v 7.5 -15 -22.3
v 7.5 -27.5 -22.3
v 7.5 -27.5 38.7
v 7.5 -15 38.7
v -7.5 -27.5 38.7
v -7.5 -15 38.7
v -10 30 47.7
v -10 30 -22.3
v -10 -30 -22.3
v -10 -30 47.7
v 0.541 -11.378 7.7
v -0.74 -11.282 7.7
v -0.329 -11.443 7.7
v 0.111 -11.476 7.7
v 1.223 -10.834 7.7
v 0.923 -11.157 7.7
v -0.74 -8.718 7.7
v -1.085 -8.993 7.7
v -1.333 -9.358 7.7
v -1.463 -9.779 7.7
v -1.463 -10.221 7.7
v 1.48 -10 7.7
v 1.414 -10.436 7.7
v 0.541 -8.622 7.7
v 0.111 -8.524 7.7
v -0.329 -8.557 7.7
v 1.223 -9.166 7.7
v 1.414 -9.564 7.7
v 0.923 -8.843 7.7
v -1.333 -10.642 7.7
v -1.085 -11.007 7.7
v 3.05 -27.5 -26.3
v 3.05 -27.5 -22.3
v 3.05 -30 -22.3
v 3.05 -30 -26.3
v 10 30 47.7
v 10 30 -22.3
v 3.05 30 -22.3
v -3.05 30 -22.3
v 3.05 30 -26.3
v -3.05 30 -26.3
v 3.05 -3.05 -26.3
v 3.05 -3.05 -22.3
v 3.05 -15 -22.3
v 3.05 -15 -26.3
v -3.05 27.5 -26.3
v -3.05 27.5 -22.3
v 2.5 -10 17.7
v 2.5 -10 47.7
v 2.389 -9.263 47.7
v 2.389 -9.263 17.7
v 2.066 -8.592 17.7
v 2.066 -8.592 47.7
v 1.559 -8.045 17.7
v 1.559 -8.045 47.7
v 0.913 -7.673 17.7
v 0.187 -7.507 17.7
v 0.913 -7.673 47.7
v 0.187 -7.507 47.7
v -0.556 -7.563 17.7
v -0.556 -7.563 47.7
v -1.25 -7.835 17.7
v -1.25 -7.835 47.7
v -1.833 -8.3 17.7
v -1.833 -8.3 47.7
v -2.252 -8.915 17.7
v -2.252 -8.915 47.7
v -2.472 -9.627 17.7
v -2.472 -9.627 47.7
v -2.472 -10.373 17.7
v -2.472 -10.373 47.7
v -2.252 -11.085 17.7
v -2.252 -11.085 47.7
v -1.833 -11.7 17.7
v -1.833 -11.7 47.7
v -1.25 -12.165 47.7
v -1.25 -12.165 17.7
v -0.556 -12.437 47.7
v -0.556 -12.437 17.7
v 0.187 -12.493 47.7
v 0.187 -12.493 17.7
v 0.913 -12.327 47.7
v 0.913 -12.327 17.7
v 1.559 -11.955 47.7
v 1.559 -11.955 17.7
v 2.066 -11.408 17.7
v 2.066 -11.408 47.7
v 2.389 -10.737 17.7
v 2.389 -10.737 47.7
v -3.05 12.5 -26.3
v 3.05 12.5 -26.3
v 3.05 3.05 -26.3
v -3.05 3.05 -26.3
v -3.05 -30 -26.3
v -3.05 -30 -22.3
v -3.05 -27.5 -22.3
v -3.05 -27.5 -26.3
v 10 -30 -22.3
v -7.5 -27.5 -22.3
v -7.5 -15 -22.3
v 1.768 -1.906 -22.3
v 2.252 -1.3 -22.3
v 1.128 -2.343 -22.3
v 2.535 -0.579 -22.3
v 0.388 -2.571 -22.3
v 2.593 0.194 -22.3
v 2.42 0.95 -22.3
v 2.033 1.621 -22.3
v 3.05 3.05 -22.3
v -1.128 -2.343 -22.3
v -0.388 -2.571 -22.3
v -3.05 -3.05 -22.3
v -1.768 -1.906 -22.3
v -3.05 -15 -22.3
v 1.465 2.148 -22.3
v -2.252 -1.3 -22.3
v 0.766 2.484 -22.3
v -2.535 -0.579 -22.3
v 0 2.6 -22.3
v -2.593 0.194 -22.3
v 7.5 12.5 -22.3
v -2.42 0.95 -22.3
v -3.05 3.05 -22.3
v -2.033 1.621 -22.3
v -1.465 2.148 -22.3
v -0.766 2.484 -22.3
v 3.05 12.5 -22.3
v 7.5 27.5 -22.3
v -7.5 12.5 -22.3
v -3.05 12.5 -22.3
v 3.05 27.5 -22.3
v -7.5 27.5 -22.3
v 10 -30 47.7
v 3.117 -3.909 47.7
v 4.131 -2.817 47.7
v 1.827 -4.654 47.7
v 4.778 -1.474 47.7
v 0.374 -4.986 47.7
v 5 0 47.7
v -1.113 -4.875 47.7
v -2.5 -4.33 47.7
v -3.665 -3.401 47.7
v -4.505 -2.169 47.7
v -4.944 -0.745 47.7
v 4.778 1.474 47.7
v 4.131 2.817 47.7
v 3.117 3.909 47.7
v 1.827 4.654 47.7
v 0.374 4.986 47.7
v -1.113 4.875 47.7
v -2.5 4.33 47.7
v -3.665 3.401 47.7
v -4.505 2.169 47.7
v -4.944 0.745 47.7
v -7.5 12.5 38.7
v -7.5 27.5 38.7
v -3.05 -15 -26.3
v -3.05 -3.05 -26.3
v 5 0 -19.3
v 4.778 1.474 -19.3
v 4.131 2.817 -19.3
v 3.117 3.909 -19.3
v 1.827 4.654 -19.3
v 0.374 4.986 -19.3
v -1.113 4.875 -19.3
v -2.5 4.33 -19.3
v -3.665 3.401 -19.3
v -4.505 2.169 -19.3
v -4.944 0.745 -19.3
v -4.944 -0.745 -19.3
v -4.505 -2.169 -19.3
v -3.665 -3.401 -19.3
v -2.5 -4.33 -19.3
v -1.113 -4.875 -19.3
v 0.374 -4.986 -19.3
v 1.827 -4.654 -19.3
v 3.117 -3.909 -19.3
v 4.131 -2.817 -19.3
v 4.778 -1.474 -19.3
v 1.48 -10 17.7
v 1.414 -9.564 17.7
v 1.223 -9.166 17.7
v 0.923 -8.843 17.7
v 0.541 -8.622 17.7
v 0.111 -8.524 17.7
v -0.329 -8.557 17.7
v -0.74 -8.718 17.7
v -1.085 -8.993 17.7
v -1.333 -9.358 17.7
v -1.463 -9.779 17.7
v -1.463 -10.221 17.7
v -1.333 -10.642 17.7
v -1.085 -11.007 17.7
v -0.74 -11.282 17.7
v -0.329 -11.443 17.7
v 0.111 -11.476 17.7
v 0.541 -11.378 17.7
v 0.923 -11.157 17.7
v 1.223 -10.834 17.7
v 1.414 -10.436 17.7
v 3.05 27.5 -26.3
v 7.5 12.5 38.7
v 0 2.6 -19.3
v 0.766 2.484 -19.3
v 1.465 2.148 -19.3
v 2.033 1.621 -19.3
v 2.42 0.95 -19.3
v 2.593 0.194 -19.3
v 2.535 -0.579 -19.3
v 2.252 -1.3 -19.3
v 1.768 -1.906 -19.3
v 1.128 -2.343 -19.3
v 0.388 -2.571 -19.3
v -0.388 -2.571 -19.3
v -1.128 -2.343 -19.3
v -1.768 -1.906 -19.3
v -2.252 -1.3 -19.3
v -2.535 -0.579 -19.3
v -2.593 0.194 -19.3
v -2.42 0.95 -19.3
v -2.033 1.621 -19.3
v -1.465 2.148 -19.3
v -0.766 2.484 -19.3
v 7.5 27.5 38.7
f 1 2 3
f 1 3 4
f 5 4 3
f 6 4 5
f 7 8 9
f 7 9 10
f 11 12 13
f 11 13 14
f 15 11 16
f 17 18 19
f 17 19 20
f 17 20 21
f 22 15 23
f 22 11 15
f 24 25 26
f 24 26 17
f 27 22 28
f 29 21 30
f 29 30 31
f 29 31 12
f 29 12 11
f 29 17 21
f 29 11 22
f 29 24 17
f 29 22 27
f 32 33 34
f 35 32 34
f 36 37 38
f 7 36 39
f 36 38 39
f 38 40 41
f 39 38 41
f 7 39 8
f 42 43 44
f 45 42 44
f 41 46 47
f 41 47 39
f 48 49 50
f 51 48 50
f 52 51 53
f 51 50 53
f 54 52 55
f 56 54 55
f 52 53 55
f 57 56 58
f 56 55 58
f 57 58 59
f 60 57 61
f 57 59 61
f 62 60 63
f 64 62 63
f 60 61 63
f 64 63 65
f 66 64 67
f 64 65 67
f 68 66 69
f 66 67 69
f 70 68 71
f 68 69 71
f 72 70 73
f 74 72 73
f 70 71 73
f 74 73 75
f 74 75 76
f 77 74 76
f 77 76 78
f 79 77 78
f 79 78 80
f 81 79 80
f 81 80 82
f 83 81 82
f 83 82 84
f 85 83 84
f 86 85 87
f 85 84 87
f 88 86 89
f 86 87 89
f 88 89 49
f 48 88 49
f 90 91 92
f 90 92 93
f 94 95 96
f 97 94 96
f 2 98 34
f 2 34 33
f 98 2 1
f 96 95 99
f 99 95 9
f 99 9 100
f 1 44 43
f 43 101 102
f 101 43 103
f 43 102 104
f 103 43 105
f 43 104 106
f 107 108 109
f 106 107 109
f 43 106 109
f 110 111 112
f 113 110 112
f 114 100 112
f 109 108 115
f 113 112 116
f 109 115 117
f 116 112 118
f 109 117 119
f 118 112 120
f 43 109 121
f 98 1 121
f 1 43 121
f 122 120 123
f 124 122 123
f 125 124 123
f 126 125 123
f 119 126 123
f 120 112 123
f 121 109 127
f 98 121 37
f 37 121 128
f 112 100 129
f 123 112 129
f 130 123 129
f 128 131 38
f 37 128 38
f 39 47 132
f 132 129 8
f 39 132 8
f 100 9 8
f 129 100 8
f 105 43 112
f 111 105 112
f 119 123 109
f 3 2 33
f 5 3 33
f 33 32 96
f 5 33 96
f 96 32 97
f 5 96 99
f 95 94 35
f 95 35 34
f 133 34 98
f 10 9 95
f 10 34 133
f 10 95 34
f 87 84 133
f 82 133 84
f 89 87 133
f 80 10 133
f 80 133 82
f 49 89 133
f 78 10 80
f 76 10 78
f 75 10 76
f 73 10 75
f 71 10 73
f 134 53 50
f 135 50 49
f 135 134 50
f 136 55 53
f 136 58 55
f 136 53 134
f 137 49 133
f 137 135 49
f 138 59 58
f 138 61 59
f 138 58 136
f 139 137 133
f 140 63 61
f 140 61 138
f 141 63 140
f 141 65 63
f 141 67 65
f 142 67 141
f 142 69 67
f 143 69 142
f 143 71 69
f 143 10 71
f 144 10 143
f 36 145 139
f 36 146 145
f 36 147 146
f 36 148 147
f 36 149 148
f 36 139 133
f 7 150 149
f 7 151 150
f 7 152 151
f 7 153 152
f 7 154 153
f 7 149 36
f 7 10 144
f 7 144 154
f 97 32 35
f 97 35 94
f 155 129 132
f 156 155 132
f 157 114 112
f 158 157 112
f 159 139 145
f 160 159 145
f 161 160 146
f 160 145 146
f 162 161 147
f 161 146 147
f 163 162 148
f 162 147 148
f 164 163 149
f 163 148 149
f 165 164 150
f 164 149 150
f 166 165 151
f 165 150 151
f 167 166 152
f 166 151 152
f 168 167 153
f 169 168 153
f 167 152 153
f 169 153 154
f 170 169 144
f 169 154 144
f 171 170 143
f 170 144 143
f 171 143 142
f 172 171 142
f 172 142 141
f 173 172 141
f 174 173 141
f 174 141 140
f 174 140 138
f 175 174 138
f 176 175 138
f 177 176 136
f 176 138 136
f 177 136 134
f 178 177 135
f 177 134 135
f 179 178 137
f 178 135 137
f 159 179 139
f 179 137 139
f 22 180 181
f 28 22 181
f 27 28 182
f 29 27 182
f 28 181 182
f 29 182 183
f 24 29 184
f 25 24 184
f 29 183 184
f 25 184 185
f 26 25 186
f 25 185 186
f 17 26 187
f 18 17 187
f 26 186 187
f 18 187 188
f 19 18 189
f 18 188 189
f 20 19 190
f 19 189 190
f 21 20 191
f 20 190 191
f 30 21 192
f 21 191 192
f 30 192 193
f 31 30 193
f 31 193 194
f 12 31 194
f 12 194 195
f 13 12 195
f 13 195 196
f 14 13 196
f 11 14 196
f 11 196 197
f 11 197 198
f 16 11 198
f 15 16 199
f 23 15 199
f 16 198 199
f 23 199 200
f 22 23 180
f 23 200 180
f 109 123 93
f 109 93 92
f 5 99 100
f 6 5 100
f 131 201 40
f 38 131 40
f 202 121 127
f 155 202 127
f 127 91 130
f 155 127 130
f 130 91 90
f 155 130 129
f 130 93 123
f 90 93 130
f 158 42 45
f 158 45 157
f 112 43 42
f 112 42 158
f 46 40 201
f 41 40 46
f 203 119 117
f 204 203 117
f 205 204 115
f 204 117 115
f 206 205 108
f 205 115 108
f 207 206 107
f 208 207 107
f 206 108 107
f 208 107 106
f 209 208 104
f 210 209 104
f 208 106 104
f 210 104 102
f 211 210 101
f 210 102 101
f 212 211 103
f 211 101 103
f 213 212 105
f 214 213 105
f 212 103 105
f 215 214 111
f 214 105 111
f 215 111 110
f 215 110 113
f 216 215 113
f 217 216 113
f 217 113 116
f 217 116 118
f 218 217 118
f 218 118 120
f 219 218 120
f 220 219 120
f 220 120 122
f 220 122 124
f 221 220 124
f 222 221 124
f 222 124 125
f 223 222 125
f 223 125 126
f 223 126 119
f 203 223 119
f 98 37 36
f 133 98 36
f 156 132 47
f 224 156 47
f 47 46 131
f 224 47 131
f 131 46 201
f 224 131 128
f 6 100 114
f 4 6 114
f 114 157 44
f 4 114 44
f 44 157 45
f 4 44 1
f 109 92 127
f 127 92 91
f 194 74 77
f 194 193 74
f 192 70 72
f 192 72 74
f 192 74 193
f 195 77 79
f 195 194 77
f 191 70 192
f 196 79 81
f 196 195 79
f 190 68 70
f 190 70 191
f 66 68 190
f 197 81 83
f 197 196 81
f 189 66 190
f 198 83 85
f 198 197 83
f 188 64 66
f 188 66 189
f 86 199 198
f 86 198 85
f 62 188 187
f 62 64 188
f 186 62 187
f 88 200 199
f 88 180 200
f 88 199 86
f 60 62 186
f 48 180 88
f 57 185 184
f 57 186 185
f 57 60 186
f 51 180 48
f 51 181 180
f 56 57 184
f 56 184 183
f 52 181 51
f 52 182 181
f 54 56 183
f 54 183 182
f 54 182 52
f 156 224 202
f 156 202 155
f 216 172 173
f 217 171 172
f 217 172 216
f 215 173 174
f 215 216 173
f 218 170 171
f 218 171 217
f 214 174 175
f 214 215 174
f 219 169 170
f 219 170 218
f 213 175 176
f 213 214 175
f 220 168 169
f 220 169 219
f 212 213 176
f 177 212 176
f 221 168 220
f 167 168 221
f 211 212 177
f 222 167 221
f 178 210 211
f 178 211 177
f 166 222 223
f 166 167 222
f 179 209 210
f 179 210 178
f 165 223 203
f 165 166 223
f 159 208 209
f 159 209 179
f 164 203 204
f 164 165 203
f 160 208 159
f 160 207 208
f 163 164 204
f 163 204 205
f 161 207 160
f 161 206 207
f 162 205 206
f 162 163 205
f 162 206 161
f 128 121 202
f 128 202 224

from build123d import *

# Parameters (mm, degrees)
EXTRUDE_1_DEPTH      = 14
CUT_EXTRUDE_1_DEPTH  = 44
SKETCH_3_W           = 6.2
SKETCH_3_H           = 6.2
CUT_EXTRUDE_2_DEPTH  = 4
SKETCH_4_R           = 4
CUT_EXTRUDE_3_DEPTH  = 5
SKETCH_5_R           = 2.6
CUT_EXTRUDE_4_DEPTH  = 5
CUT_EXTRUDE_5_DEPTH  = 50
EXTRUDE_2_DEPTH      = 8
EXTRUDE_3_DEPTH      = 8
SKETCH_10_W          = 20
SKETCH_10_H          = 10
EXTRUDE_4_DEPTH      = 18
SKETCH_12_R          = 1.48
CUT_EXTRUDE_6_DEPTH  = 20
SKETCH_13_W          = 4
SKETCH_13_H          = 40
CUT_EXTRUDE_7_DEPTH  = 22
SKETCH_16_R          = 5
CUT_EXTRUDE_8_DEPTH  = 3
SKETCH_17_R          = 5
CUT_EXTRUDE_9_DEPTH  = 3
SKETCH_18_R          = 2.6
CUT_EXTRUDE_10_DEPTH = 99
SKETCH_19_R          = 5
EXTRUDE_5_DEPTH      = 6
SKETCH_20_W          = 6.2
SKETCH_20_H          = 6.2
CUT_EXTRUDE_11_DEPTH = 4
SKETCH_21_W          = 6.2
SKETCH_21_H          = 6.2
EXTRUDE_6_DEPTH      = 4
SKETCH_22_W          = 0.05
SKETCH_22_H          = 60
CUT_EXTRUDE_12_DEPTH = 4
EXTRUDE_START        = 6
SKETCH_25_W          = 20
SKETCH_25_H          = 10
SKETCH_25_R          = 1.48
EXTRUDE_7_DEPTH      = 6
CUT_EXTRUDE_13_DEPTH = 7
SKETCH_28_W          = 8
SKETCH_28_H          = 10
EXTRUDE_8_DEPTH      = 20
CUT_EXTRUDE_14_DEPTH = 7
SKETCH_30_W          = 6
SKETCH_30_H          = 2.9827115
SKETCH_30_H_2        = 3.265133333
EXTRUDE_9_DEPTH      = 7
SKETCH_31_W          = 6
SKETCH_31_H          = 2
EXTRUDE_10_DEPTH     = 10
SKETCH_32_W          = 6.1
SKETCH_32_H          = 3
CUT_EXTRUDE_15_DEPTH = 10
SKETCH_33_W          = 6.1
SKETCH_33_H          = 3
CUT_EXTRUDE_16_DEPTH = 4
SKETCH_34_W          = 10
SKETCH_34_H          = 5
CUT_EXTRUDE_17_DEPTH = 6
SKETCH_35_W          = 1
SKETCH_35_H          = 5
CUT_EXTRUDE_18_DEPTH = 14
SKETCH_36_W          = 6
SKETCH_36_H          = 5
EXTRUDE_11_DEPTH     = 6
SKETCH_37_W          = 8
SKETCH_37_H          = 1
CUT_EXTRUDE_19_DEPTH = 2
SKETCH_38_R          = 5
EXTRUDE_12_DEPTH     = 6
SKETCH_39_R          = 2.6
CUT_EXTRUDE_20_DEPTH = 10
SKETCH_40_R          = 5
CUT_EXTRUDE_21_DEPTH = 3
EXTRUDE_START_2      = 1
SKETCH_41_W          = 20
SKETCH_41_H          = 40
SKETCH_41_R          = 5
EXTRUDE_13_DEPTH     = 1
SKETCH_42_W          = 20
SKETCH_42_H          = 10
SKETCH_42_R          = 1.48
EXTRUDE_14_DEPTH     = 1
SKETCH_43_W          = 5
SKETCH_43_H          = 5
CUT_EXTRUDE_22_DEPTH = 15
EXTRUDE_15_DEPTH     = 2
SKETCH_45_W          = 6.1
SKETCH_45_H          = 18.1
EXTRUDE_16_DEPTH     = 10
CUT_EXTRUDE_START    = -4
CUT_EXTRUDE_23_DEPTH = 4
SKETCH_47_W          = 15
SKETCH_47_H          = 7.002427308
EXTRUDE_17_DEPTH     = 4
CUT_EXTRUDE_24_DEPTH = 1
SKETCH_49_W          = 2
SKETCH_49_H          = 1
CUT_EXTRUDE_27_DEPTH = 12.5
SKETCH_51_W          = 5
SKETCH_51_H          = 1
EXTRUDE_18_DEPTH     = 1
CUT_EXTRUDE_28_DEPTH = 5
EXTRUDE_19_DEPTH     = 7.5
SKETCH_54_W          = 6.95
SKETCH_54_H          = 2
CUT_EXTRUDE_29_DEPTH = 7.5
SKETCH_55_W          = 6.1
SKETCH_55_H          = 3
CUT_EXTRUDE_30_DEPTH = 4
SKETCH_56_W          = 0.55
SKETCH_56_H          = 0.142857143
EXTRUDE_20_DEPTH     = 4
SKETCH_60_W          = 26.3
SKETCH_60_H          = 60
EXTRUDE_21_DEPTH     = 20
EXTRUDE_22_DEPTH     = 4
SKETCH_62_R          = 2.6
CUT_EXTRUDE_31_DEPTH = 50
SKETCH_63_R          = 5
CUT_EXTRUDE_32_DEPTH = 30.3
CUT_EXTRUDE_33_DEPTH = 4
CUT_EXTRUDE_34_DEPTH = 2
SKETCH_66_W          = 5
SKETCH_66_H          = 2
CUT_EXTRUDE_35_DEPTH = 50
CUT_EXTRUDE_36_DEPTH = 4
SKETCH_68_W          = 5
SKETCH_68_H          = 2
CUT_EXTRUDE_37_DEPTH = 2
SKETCH_69_W          = 13
SKETCH_69_H          = 7
EXTRUDE_23_DEPTH     = 15
SKETCH_70_W          = 13
SKETCH_70_H          = 7
CUT_EXTRUDE_38_DEPTH = 15
SKETCH_72_W          = 20
SKETCH_72_H          = 60
EXTRUDE_24_DEPTH     = 61.3
SKETCH_73_W          = 6.1
SKETCH_73_H          = 12
EXTRUDE_25_DEPTH     = 4
SKETCH_74_R          = 2.6
CUT_EXTRUDE_39_DEPTH = 70
SKETCH_76_W          = 70
SKETCH_76_H          = 60
EXTRUDE_26_DEPTH     = 20
SKETCH_77_R          = 2.6
CUT_EXTRUDE_40_DEPTH = 70
SKETCH_78_R          = 5
CUT_EXTRUDE_41_DEPTH = 67
SKETCH_79_R          = 2.5
CUT_EXTRUDE_42_DEPTH = 30
SKETCH_80_R          = 1.48
CUT_EXTRUDE_43_DEPTH = 10
SKETCH_81_W          = 4.45
SKETCH_81_H          = 15
SKETCH_81_W_2        = 6.1
CUT_EXTRUDE_45_DEPTH = 65
SKETCH_82_W          = 4.45
SKETCH_82_H          = 12.5
SKETCH_82_W_2        = 3.05
CUT_EXTRUDE_46_DEPTH = 65


with BuildPart() as part:
    # 草图1 → 凸台-拉伸1 (new body)
    with BuildSketch(Plane.XY):
        Polygon((-15, 22), (-15, -22), (15, -22), (15, 22), (0, 22), align=None)
    extrude(amount=EXTRUDE_1_DEPTH)

    # 草图2 → 切除-拉伸1 (cut)
    with BuildSketch(Plane(origin=(0, 22, 0), x_dir=(1, 0, 0), z_dir=(0, 1, 0))):
        Polygon((-15, 0), (-15, -14), (-10, -4), (-3.1, -4), (-3.1, 0), align=None)
        Polygon((3.1, -4), (10, -4), (15, -14), (15, 0), (3.1, 0), align=None)
    extrude(amount=-CUT_EXTRUDE_1_DEPTH, mode=Mode.SUBTRACT)

    # 草图3 → 切除-拉伸2 (cut)
    with BuildSketch(Plane(origin=(0, 0, 0), x_dir=(-1, 0, 0), z_dir=(0, 0, -1))):
        Rectangle(SKETCH_3_W, SKETCH_3_H)
    extrude(amount=-CUT_EXTRUDE_2_DEPTH, mode=Mode.SUBTRACT)

    # 草图4 → 切除-拉伸3 (cut)
    with BuildSketch(Plane.XY.offset(14)):
        Circle(SKETCH_4_R)
    extrude(amount=-CUT_EXTRUDE_3_DEPTH, mode=Mode.SUBTRACT)

    # 草图5 → 切除-拉伸4 (cut)
    with BuildSketch(Plane.XY.offset(9)):
        Circle(SKETCH_5_R)
    extrude(amount=-CUT_EXTRUDE_4_DEPTH, mode=Mode.SUBTRACT)

    # 草图6 → 切除-拉伸5 (cut)
    with BuildSketch(Plane.XZ.offset(22)):
        Polygon((-10, 4), (-15, 14), (-10, 14), align=None)
        Polygon((10, 4), (10, 14), (15, 14), align=None)
    extrude(amount=-CUT_EXTRUDE_5_DEPTH, mode=Mode.SUBTRACT)

    # 草图8 → 凸台-拉伸2 (add)
    with BuildSketch(Plane(origin=(0, -22, 0), x_dir=(-1, 0, 0), z_dir=(0, -1, 0))):
        Polygon((10, -14), (-10, -14), (-10, -4), (-3.1, -4), (-3.1, 0), (3.1, 0), (3.1, -4), (10, -4), align=None)
    extrude(amount=EXTRUDE_2_DEPTH)

    # 草图9 → 凸台-拉伸3 (add)
    with BuildSketch(Plane(origin=(0, 22, 0), x_dir=(1, 0, 0), z_dir=(0, 1, 0))):
        Polygon((-3.1, -4), (-3.1, 0), (3.1, 0), (3.1, -4), (10, -4), (10, -14), (-10, -14), (-10, -4), align=None)
    extrude(amount=EXTRUDE_3_DEPTH)

    # 草图10 → 凸台-拉伸4 (add)
    with BuildSketch(Plane.XY.offset(14)):
        with Locations((0, 25)):
            Rectangle(SKETCH_10_W, SKETCH_10_H)
        with Locations((0, -25)):
            Rectangle(SKETCH_10_W, SKETCH_10_H)
    extrude(amount=EXTRUDE_4_DEPTH)

    # 草图12 → 切除-拉伸6 (cut)
    with BuildSketch(Plane.XY.offset(32)):
        with Locations((-4.9, -24.6)):
            Circle(SKETCH_12_R)
        with Locations((4.9, -24.6)):
            Circle(SKETCH_12_R)
        with Locations((-4.9, 24.6)):
            Circle(SKETCH_12_R)
        with Locations((4.9, 24.6)):
            Circle(SKETCH_12_R)
    extrude(amount=-CUT_EXTRUDE_6_DEPTH, mode=Mode.SUBTRACT)

    # 草图13 → 切除-拉伸7 (cut)
    with BuildSketch(Plane(origin=(10, 0, 0), x_dir=(0, 0, -1), z_dir=(1, 0, 0))):
        with Locations((-12, 0)):
            Rectangle(SKETCH_13_W, SKETCH_13_H)
    extrude(amount=-CUT_EXTRUDE_7_DEPTH, mode=Mode.SUBTRACT)

    # 草图16 → 切除-拉伸8 (cut)
    with BuildSketch(Plane.XY.offset(10)):
        Circle(SKETCH_16_R)
    extrude(amount=-CUT_EXTRUDE_8_DEPTH, mode=Mode.SUBTRACT)

    # 草图17 → 切除-拉伸9 (cut)
    with BuildSketch(Plane.XY.offset(10)):
        with Locations((0, 15)):
            Circle(SKETCH_17_R)
        with Locations((0, -15)):
            Circle(SKETCH_17_R)
    extrude(amount=-CUT_EXTRUDE_9_DEPTH, mode=Mode.SUBTRACT)

    # 草图18 → 切除-拉伸10 (cut)
    with BuildSketch(Plane.XY.offset(7)):
        with Locations((0, 15)):
            Circle(SKETCH_18_R)
        with Locations((0, -15)):
            Circle(SKETCH_18_R)
    extrude(amount=-CUT_EXTRUDE_10_DEPTH, mode=Mode.SUBTRACT)

    # 草图19 → 凸台-拉伸5 (add)
    with BuildSketch(Plane.XY.offset(10)):
        Circle(SKETCH_19_R)
    extrude(amount=-EXTRUDE_5_DEPTH)

    # 草图20 → 切除-拉伸11 (cut)
    with BuildSketch(Plane(origin=(0, 0, 0), x_dir=(-1, 0, 0), z_dir=(0, 0, -1))):
        Polygon((0, -11.9), (0, -15), (0, -18.1), (3.1, -18.1), (3.1, -11.9), align=None)
        Polygon((0, -18.1), (0, -15), (0, -11.9), (-3.1, -11.9), (-3.1, -18.1), align=None)
        with Locations((0, 15)):
            Rectangle(SKETCH_20_W, SKETCH_20_H)
    extrude(amount=-CUT_EXTRUDE_11_DEPTH, mode=Mode.SUBTRACT)

    # 草图21 → 凸台-拉伸6 (add)
    with BuildSketch(Plane(origin=(0, 0, 0), x_dir=(-1, 0, 0), z_dir=(0, 0, -1))):
        Rectangle(SKETCH_21_W, SKETCH_21_H)
    extrude(amount=-EXTRUDE_6_DEPTH)

    # 草图22 → 切除-拉伸12 (cut)
    with BuildSketch(Plane(origin=(0, 0, 0), x_dir=(-1, 0, 0), z_dir=(0, 0, -1))):
        with Locations((-3.075, 0)):
            Rectangle(SKETCH_22_W, SKETCH_22_H)
        with Locations((3.075, 0)):
            Rectangle(SKETCH_22_W, SKETCH_22_H)
    extrude(amount=-CUT_EXTRUDE_12_DEPTH, mode=Mode.SUBTRACT)

    # 草图25 → 凸台-拉伸7 (add)
    # profile 1 of 2: a face of its own
    with BuildSketch(Plane.XY.offset(32).offset(EXTRUDE_START)):
        with Locations((0, 25)):
            Rectangle(SKETCH_25_W, SKETCH_25_H)
        with Locations((-4.9, 24.6)):
            Circle(SKETCH_25_R, mode=Mode.SUBTRACT)
        with Locations((4.9, 24.6)):
            Circle(SKETCH_25_R, mode=Mode.SUBTRACT)
    # profile 2 of 2: a face of its own
    with BuildSketch(Plane.XY.offset(32).offset(EXTRUDE_START)):
        with Locations((0, -25)):
            Rectangle(SKETCH_25_W, SKETCH_25_H)
        with Locations((-4.9, -24.6)):
            Circle(SKETCH_25_R, mode=Mode.SUBTRACT)
        with Locations((4.9, -24.6)):
            Circle(SKETCH_25_R, mode=Mode.SUBTRACT)
    extrude(amount=-EXTRUDE_7_DEPTH)

    # 草图27 → 切除-拉伸13 (cut)
    with BuildSketch(Plane(origin=(0, -20, 0), x_dir=(1, 0, 0), z_dir=(0, 1, 0))):
        Polygon((4, -15), (4, -10), (0, -10), (-4, -10), (-4, -15), align=None)
    extrude(amount=-CUT_EXTRUDE_13_DEPTH, mode=Mode.SUBTRACT)

    # 草图28 → 凸台-拉伸8 (add)
    with BuildSketch(Plane.ZY.offset(10)):
        with Locations((14, -25)):
            Rectangle(SKETCH_28_W, SKETCH_28_H)
        with Locations((14, 25)):
            Rectangle(SKETCH_28_W, SKETCH_28_H)
    extrude(amount=-EXTRUDE_8_DEPTH)

    # 草图29 → 切除-拉伸14 (cut)
    with BuildSketch(Plane(origin=(0, -20, 0), x_dir=(1, 0, 0), z_dir=(0, 1, 0))):
        Polygon((4, -20), (4, -10), (0, -10), (-4, -10), (-4, -20), align=None)
    extrude(amount=-CUT_EXTRUDE_14_DEPTH, mode=Mode.SUBTRACT)

    # 草图30 → 凸台-拉伸9 (add)
    with BuildSketch(Plane(origin=(0, -20, 0), x_dir=(1, 0, 0), z_dir=(0, 1, 0))):
        with Locations((-7, -18.50864425)):
            Rectangle(SKETCH_30_W, SKETCH_30_H)
        with Locations((7, -18.367433334)):
            Rectangle(SKETCH_30_W, SKETCH_30_H_2)
    extrude(amount=-EXTRUDE_9_DEPTH)

    # 草图31 → 凸台-拉伸10 (add)
    with BuildSketch(Plane(origin=(0, -20, 0), x_dir=(1, 0, 0), z_dir=(0, 1, 0))):
        with Locations((7, -21)):
            Rectangle(SKETCH_31_W, SKETCH_31_H)
        Polygon((4, -22), (4, -20), (-4, -20), (-10, -20), (-10, -22), align=None)
    extrude(amount=-EXTRUDE_10_DEPTH)

    # 草图32 → 切除-拉伸15 (cut)
    with BuildSketch(Plane(origin=(0, 0, 0), x_dir=(-1, 0, 0), z_dir=(0, 0, -1))):
        with Locations((0, -25.5)):
            Rectangle(SKETCH_32_W, SKETCH_32_H)
    extrude(amount=-CUT_EXTRUDE_15_DEPTH, mode=Mode.SUBTRACT)

    # 草图33 → 切除-拉伸16 (cut)
    with BuildSketch(Plane(origin=(0, 0, 0), x_dir=(-1, 0, 0), z_dir=(0, 0, -1))):
        with Locations((0, -28.5)):
            Rectangle(SKETCH_33_W, SKETCH_33_H)
    extrude(amount=-CUT_EXTRUDE_16_DEPTH, mode=Mode.SUBTRACT)

    # 草图34 → 切除-拉伸17 (cut)
    with BuildSketch(Plane.ZY.offset(10)):
        with Locations((15, -22.5)):
            Rectangle(SKETCH_34_W, SKETCH_34_H)
    extrude(amount=-CUT_EXTRUDE_17_DEPTH, mode=Mode.SUBTRACT)

    # 草图35 → 切除-拉伸18 (cut)
    with BuildSketch(Plane.ZY.offset(10)):
        with Locations((20.5, -22.5)):
            Rectangle(SKETCH_35_W, SKETCH_35_H)
    extrude(amount=-CUT_EXTRUDE_18_DEPTH, mode=Mode.SUBTRACT)

    # 草图36 → 凸台-拉伸11 (add)
    with BuildSketch(Plane.ZY.offset(10)):
        with Locations((13, -22.5)):
            Rectangle(SKETCH_36_W, SKETCH_36_H)
    extrude(amount=-EXTRUDE_11_DEPTH)

    # 草图37 → 切除-拉伸19 (cut)
    with BuildSketch(Plane(origin=(0, -25, 0), x_dir=(1, 0, 0), z_dir=(0, 1, 0))):
        with Locations((0, -20.5)):
            Rectangle(SKETCH_37_W, SKETCH_37_H)
    extrude(amount=-CUT_EXTRUDE_19_DEPTH, mode=Mode.SUBTRACT)

    # 草图38 → 凸台-拉伸12 (add)
    with BuildSketch(Plane.XY.offset(10)):
        with Locations((0, 15)):
            Circle(SKETCH_38_R)
        with Locations((0, -15)):
            Circle(SKETCH_38_R)
    extrude(amount=-EXTRUDE_12_DEPTH)

    # 草图39 → 切除-拉伸20 (cut)
    with BuildSketch(Plane.XY.offset(10)):
        Circle(SKETCH_39_R)
    extrude(amount=-CUT_EXTRUDE_20_DEPTH, mode=Mode.SUBTRACT)

    # 草图40 → 切除-拉伸21 (cut)
    with BuildSketch(Plane.XY.offset(10)):
        Circle(SKETCH_40_R)
    extrude(amount=-CUT_EXTRUDE_21_DEPTH, mode=Mode.SUBTRACT)

    # 草图41 → 凸台-拉伸13 (add)
    with BuildSketch(Plane.XY.offset(10).offset(EXTRUDE_START_2)):
        Rectangle(SKETCH_41_W, SKETCH_41_H)
        Circle(SKETCH_41_R, mode=Mode.SUBTRACT)
    extrude(amount=-EXTRUDE_13_DEPTH)

    # 草图42 → 凸台-拉伸14 (add)
    # profile 1 of 2: a face of its own
    with BuildSketch(Plane.XY.offset(38).offset(EXTRUDE_START_2)):
        with Locations((0, 25)):
            Rectangle(SKETCH_42_W, SKETCH_42_H)
        with Locations((-4.9, 24.6)):
            Circle(SKETCH_42_R, mode=Mode.SUBTRACT)
        with Locations((4.9, 24.6)):
            Circle(SKETCH_42_R, mode=Mode.SUBTRACT)
    # profile 2 of 2: a face of its own
    with BuildSketch(Plane.XY.offset(38).offset(EXTRUDE_START_2)):
        with Locations((0, -25)):
            Rectangle(SKETCH_42_W, SKETCH_42_H)
        with Locations((-4.9, -24.6)):
            Circle(SKETCH_42_R, mode=Mode.SUBTRACT)
        with Locations((4.9, -24.6)):
            Circle(SKETCH_42_R, mode=Mode.SUBTRACT)
    extrude(amount=-EXTRUDE_14_DEPTH)

    # 草图43 → 切除-拉伸22 (cut)
    with BuildSketch(Plane.ZY.offset(10)):
        Polygon((24, -27), (24, -20), (21, -20), (21, -25), (16, -25), (16, -20), (11, -20), (10.997708979, -20), (10.997708979, -27), align=None)
        with Locations((18.5, -22.5)):
            Rectangle(SKETCH_43_W, SKETCH_43_H)
    extrude(amount=-CUT_EXTRUDE_22_DEPTH, mode=Mode.SUBTRACT)

    # 草图44 → 凸台-拉伸15 (add)
    with BuildSketch(Plane(origin=(0, 0, 24), x_dir=(-1, 0, 0), z_dir=(0, 0, -1))):
        with BuildLine():
            Line((-5, -26.076617757), (-5, -23.123382243))
            ThreePointArc((-5, -23.123382243), (-6.38, -24.6), (-5, -26.076617757))
        make_face()
    extrude(amount=EXTRUDE_15_DEPTH)

    # 草图45 → 凸台-拉伸16 (add)
    with BuildSketch(Plane(origin=(0, 0, 0), x_dir=(-1, 0, 0), z_dir=(0, 0, -1))):
        with Locations((0, -20.95)):
            Rectangle(SKETCH_45_W, SKETCH_45_H)
        with Locations((0, 20.95)):
            Rectangle(SKETCH_45_W, SKETCH_45_H)
    extrude(amount=-EXTRUDE_16_DEPTH)

    # 草图46 → 切除-拉伸23 (cut)
    with BuildSketch(Plane(origin=(0, 0, 0), x_dir=(-1, 0, 0), z_dir=(0, 0, -1)).offset(CUT_EXTRUDE_START)):
        with BuildLine():
            Line((0, 2.6), (0, 0))
            Line((0, 0), (0, -2.6))
            ThreePointArc((0, -2.6), (1.838477631, -1.838477631), (2.6, 0))
            ThreePointArc((2.6, 0), (1.838477631, 1.838477631), (0, 2.6))
        make_face()
        with BuildLine():
            Line((0, -2.6), (0, 0))
            Line((0, 0), (0, 2.6))
            ThreePointArc((0, 2.6), (-2.6, 0), (0, -2.6))
        make_face()
        with BuildLine():
            ThreePointArc((0, -2.6), (-2.6, 0), (0, 2.6))
            Line((0, 2.6), (0, 3.05))
            Line((0, 3.05), (-3.05, 3.05))
            Line((-3.05, 3.05), (-3.05, -3.05))
            Line((-3.05, -3.05), (0, -3.05))
            Line((0, -3.05), (0, -2.6))
        make_face()
        with BuildLine():
            Line((0, 3.05), (0, 2.6))
            ThreePointArc((0, 2.6), (1.838477631, 1.838477631), (2.6, 0))
            ThreePointArc((2.6, 0), (1.838477631, -1.838477631), (0, -2.6))
            Line((0, -2.6), (0, -3.05))
            Line((0, -3.05), (3.05, -3.05))
            Line((3.05, -3.05), (3.05, 3.05))
            Line((3.05, 3.05), (0, 3.05))
        make_face()
    extrude(amount=CUT_EXTRUDE_23_DEPTH, mode=Mode.SUBTRACT)

    # 草图47 → 凸台-拉伸17 (add)
    with BuildSketch(Plane.XY.offset(11)):
        with Locations((-2.5, -23.501213654)):
            Rectangle(SKETCH_47_W, SKETCH_47_H)
    extrude(amount=-EXTRUDE_17_DEPTH)

    # 草图48 → 切除-拉伸24 (cut)
    with BuildSketch(Plane.XY.offset(11)):
        with BuildLine():
            Line((-2.5, 20), (-2.5, 4.330127019))
            ThreePointArc((-2.5, 4.330127019), (0, 5), (2.5, 4.330127019))
            Line((2.5, 4.330127019), (2.5, 20))
            Line((2.5, 20), (-2.5, 20))
        make_face()
        with BuildLine():
            Line((-2.5, -27), (0, -27))
            Line((0, -27), (2.5, -27))
            Line((2.5, -27), (2.5, -4.330127019))
            ThreePointArc((2.5, -4.330127019), (0, -5), (-2.5, -4.330127019))
            Line((-2.5, -4.330127019), (-2.5, -27))
        make_face()
    extrude(amount=-CUT_EXTRUDE_24_DEPTH, mode=Mode.SUBTRACT)

    # 草图49 → 切除-拉伸27 (cut)
    with BuildSketch(Plane.ZY.offset(10)):
        with Locations((10, 19.5)):
            Rectangle(SKETCH_49_W, SKETCH_49_H)
        Polygon((9, 20), (11, 20), (4, 30), (4, 27.142857143), align=None)
        Polygon((4, 27.142857143), (4, 30), (4, 31.546618197), (2, 31.546618197), (2, 30), align=None)
    extrude(amount=-CUT_EXTRUDE_27_DEPTH, mode=Mode.SUBTRACT)

    # 草图51 → 凸台-拉伸18 (add)
    with BuildSketch(Plane(origin=(0, 19, 0), x_dir=(1, 0, 0), z_dir=(0, 1, 0))):
        with Locations((0, -9.5)):
            Rectangle(SKETCH_51_W, SKETCH_51_H)
    extrude(amount=EXTRUDE_18_DEPTH)

    # 草图52 → 切除-拉伸28 (cut)
    with BuildSketch(Plane.ZY.offset(2.5)):
        Polygon((9, 20), (10, 19), (10, 20), align=None)
    extrude(amount=-CUT_EXTRUDE_28_DEPTH, mode=Mode.SUBTRACT)

    # 草图53 → 凸台-拉伸19 (add)
    with BuildSketch(Plane.ZY.offset(10)):
        Polygon((11, 20), (4, 30), (2, 30), (9, 20), (9, 19), (11, 19), align=None)
    extrude(amount=-EXTRUDE_19_DEPTH)

    # 草图54 → 切除-拉伸29 (cut)
    with BuildSketch(Plane(origin=(0, 30, 0), x_dir=(1, 0, 0), z_dir=(0, 1, 0))):
        with Locations((-6.525, -3)):
            Rectangle(SKETCH_54_W, SKETCH_54_H)
    extrude(amount=-CUT_EXTRUDE_29_DEPTH, mode=Mode.SUBTRACT)

    # 草图55 → 切除-拉伸30 (cut)
    with BuildSketch(Plane(origin=(0, 0, 0), x_dir=(-1, 0, 0), z_dir=(0, 0, -1))):
        with Locations((0, 28.5)):
            Rectangle(SKETCH_55_W, SKETCH_55_H)
    extrude(amount=-CUT_EXTRUDE_30_DEPTH, mode=Mode.SUBTRACT)

    # 草图56 → 凸台-拉伸20 (add)
    with BuildSketch(Plane(origin=(0, 0, 4), x_dir=(-1, 0, 0), z_dir=(0, 0, -1))):
        with Locations((-2.775, 27.071428572)):
            Rectangle(SKETCH_56_W, SKETCH_56_H)
        Polygon((2.5, 27.142857143), (-2.5, 27.142857143), (-2.5, 27), (3.05, 27), (3.05, 27.142857143), align=None)
    extrude(amount=EXTRUDE_20_DEPTH)

    # 草图60 → 凸台-拉伸21 (add)
    with BuildSketch(Plane.ZY.offset(10)):
        with Locations((-9.15, 0)):
            Rectangle(SKETCH_60_W, SKETCH_60_H)
        Polygon((11, -27), (11, 20), (11, 30), (4, 30), (4, -30), (11, -30), align=None)
    extrude(amount=-EXTRUDE_21_DEPTH)

    # 草图61 → 凸台-拉伸22 (add)
    with BuildSketch(Plane(origin=(0, 0, -22.3), x_dir=(-1, 0, 0), z_dir=(0, 0, -1))):
        Polygon((0, -30), (0, 0), (0, 30), (-3.05, 30), (-3.05, -30), align=None)
        Polygon((0, 30), (0, 0), (0, -30), (3.05, -30), (3.05, 30), align=None)
    extrude(amount=EXTRUDE_22_DEPTH)

    # 草图62 → 切除-拉伸31 (cut)
    with BuildSketch(Plane.XY.offset(11)):
        Circle(SKETCH_62_R)
    extrude(amount=-CUT_EXTRUDE_31_DEPTH, mode=Mode.SUBTRACT)

    # 草图63 → 切除-拉伸32 (cut)
    with BuildSketch(Plane.XY.offset(11)):
        Circle(SKETCH_63_R)
    extrude(amount=-CUT_EXTRUDE_32_DEPTH, mode=Mode.SUBTRACT)

    # 草图64 → 切除-拉伸33 (cut)
    with BuildSketch(Plane(origin=(0, 0, -26.3), x_dir=(-1, 0, 0), z_dir=(0, 0, -1)).offset(CUT_EXTRUDE_START)):
        with BuildLine():
            Line((0, 3.05), (0, 2.6))
            ThreePointArc((0, 2.6), (1.838477631, 1.838477631), (2.6, 0))
            ThreePointArc((2.6, 0), (1.838477631, -1.838477631), (0, -2.6))
            Line((0, -2.6), (0, -3.05))
            Line((0, -3.05), (3.05, -3.05))
            Line((3.05, -3.05), (3.05, 3.05))
            Line((3.05, 3.05), (0, 3.05))
        make_face()
        with BuildLine():
            ThreePointArc((0, -2.6), (-2.6, 0), (0, 2.6))
            Line((0, 2.6), (0, 3.05))
            Line((0, 3.05), (-3.05, 3.05))
            Line((-3.05, 3.05), (-3.05, -3.05))
            Line((-3.05, -3.05), (0, -3.05))
            Line((0, -3.05), (0, -2.6))
        make_face()
    extrude(amount=CUT_EXTRUDE_33_DEPTH, mode=Mode.SUBTRACT)

    # 草图65 → 切除-拉伸34 (cut)
    with BuildSketch(Plane.XY.offset(11)):
        with BuildLine():
            Line((0, 20), (0, 5))
            ThreePointArc((0, 5), (1.294095226, 4.829629131), (2.5, 4.330127019))
            Line((2.5, 4.330127019), (2.5, 20))
            Line((2.5, 20), (0, 20))
        make_face()
        with BuildLine():
            ThreePointArc((-2.5, 4.330127019), (-1.294095226, 4.829629131), (0, 5))
            Line((0, 5), (0, 20))
            Line((0, 20), (-2.5, 20))
            Line((-2.5, 20), (-2.5, 4.330127019))
        make_face()
        with BuildLine():
            ThreePointArc((2.5, -4.330127019), (1.294095226, -4.829629131), (0, -5))
            Line((0, -5), (0, -27))
            Line((0, -27), (2.5, -27))
            Line((2.5, -27), (2.5, -4.330127019))
        make_face()
        with BuildLine():
            Line((0, -27), (0, -5))
            ThreePointArc((0, -5), (-1.294095226, -4.829629131), (-2.5, -4.330127019))
            Line((-2.5, -4.330127019), (-2.5, -27))
            Line((-2.5, -27), (0, -27))
        make_face()
    extrude(amount=-CUT_EXTRUDE_34_DEPTH, mode=Mode.SUBTRACT)

    # 草图66 → 切除-拉伸35 (cut)
    with BuildSketch(Plane.XY.offset(9)):
        with Locations((0, 19)):
            Rectangle(SKETCH_66_W, SKETCH_66_H)
    extrude(amount=-CUT_EXTRUDE_35_DEPTH, mode=Mode.SUBTRACT)

    # 草图67 → 切除-拉伸36 (cut)
    with BuildSketch(Plane(origin=(0, 0, -26.3), x_dir=(-1, 0, 0), z_dir=(0, 0, -1))):
        Polygon((2.5, 20), (2.5, 18), (3.05, 18), (3.05, 30), (-3.05, 30), (-3.05, 18), (-2.5, 18), (-2.5, 20), align=None)
    extrude(amount=-CUT_EXTRUDE_36_DEPTH, mode=Mode.SUBTRACT)

    # 草图68 → 切除-拉伸37 (cut)
    with BuildSketch(Plane.XY.offset(9)):
        with Locations((0, 17)):
            Rectangle(SKETCH_68_W, SKETCH_68_H)
    extrude(amount=-CUT_EXTRUDE_37_DEPTH, mode=Mode.SUBTRACT)

    # 草图69 → 凸台-拉伸23 (add)
    with BuildSketch(Plane.ZY.offset(-5)):
        with Locations((17.5, -23.5)):
            Rectangle(SKETCH_69_W, SKETCH_69_H)
    extrude(amount=EXTRUDE_23_DEPTH)

    # 草图70 → 切除-拉伸38 (cut)
    with BuildSketch(Plane(origin=(10, 0, 0), x_dir=(0, 0, -1), z_dir=(1, 0, 0))):
        with Locations((-17.5, -23.5)):
            Rectangle(SKETCH_70_W, SKETCH_70_H)
    extrude(amount=-CUT_EXTRUDE_38_DEPTH, mode=Mode.SUBTRACT)

    # 草图72 → 凸台-拉伸24 (add)
    with BuildSketch(Plane.XY.offset(39)):
        Rectangle(SKETCH_72_W, SKETCH_72_H)
    extrude(amount=-EXTRUDE_24_DEPTH)

    # 草图73 → 凸台-拉伸25 (add)
    with BuildSketch(Plane(origin=(0, 0, -26.3), x_dir=(-1, 0, 0), z_dir=(0, 0, -1))):
        with Locations((0, 24)):
            Rectangle(SKETCH_73_W, SKETCH_73_H)
    extrude(amount=-EXTRUDE_25_DEPTH)

    # 草图74 → 切除-拉伸39 (cut)
    with BuildSketch(Plane(origin=(0, 0, -22.3), x_dir=(-1, 0, 0), z_dir=(0, 0, -1))):
        with Locations(Location((0, 0, 0), (0, 0, 90))):
            Circle(SKETCH_74_R)
    extrude(amount=-CUT_EXTRUDE_39_DEPTH, mode=Mode.SUBTRACT)

    # 草图76 → 凸台-拉伸26 (add)
    with BuildSketch(Plane.ZY.offset(10)):
        with Locations((12.7, 0)):
            Rectangle(SKETCH_76_W, SKETCH_76_H)
    extrude(amount=-EXTRUDE_26_DEPTH)

    # 草图77 → 切除-拉伸40 (cut)
    with BuildSketch(Plane(origin=(0, 0, -22.3), x_dir=(-1, 0, 0), z_dir=(0, 0, -1))):
        with Locations(Location((0, 0, 0), (0, 0, 90))):
            Circle(SKETCH_77_R)
    extrude(amount=-CUT_EXTRUDE_40_DEPTH, mode=Mode.SUBTRACT)

    # 草图78 → 切除-拉伸41 (cut)
    with BuildSketch(Plane.XY.offset(47.7)):
        Circle(SKETCH_78_R)
    extrude(amount=-CUT_EXTRUDE_41_DEPTH, mode=Mode.SUBTRACT)

    # 草图79 → 切除-拉伸42 (cut)
    with BuildSketch(Plane.XY.offset(47.7)):
        with Locations((0, -10)):
            Circle(SKETCH_79_R)
    extrude(amount=-CUT_EXTRUDE_42_DEPTH, mode=Mode.SUBTRACT)

    # 草图80 → 切除-拉伸43 (cut)
    with BuildSketch(Plane.XY.offset(17.7)):
        with Locations((0, -10)):
            Circle(SKETCH_80_R)
    extrude(amount=-CUT_EXTRUDE_43_DEPTH, mode=Mode.SUBTRACT)

    # 草图81 → 切除-拉伸45 (cut)
    with BuildSketch(Plane(origin=(0, 0, -26.3), x_dir=(-1, 0, 0), z_dir=(0, 0, -1))):
        with Locations((-5.275, 20)):
            Rectangle(SKETCH_81_W, SKETCH_81_H)
        with Locations((0, 20)):
            Rectangle(SKETCH_81_W_2, SKETCH_81_H)
        with Locations((5.275, 20)):
            Rectangle(SKETCH_81_W, SKETCH_81_H)
    extrude(amount=-CUT_EXTRUDE_45_DEPTH, mode=Mode.SUBTRACT)

    # 草图82 → 切除-拉伸46 (cut)
    with BuildSketch(Plane(origin=(0, 0, -26.3), x_dir=(-1, 0, 0), z_dir=(0, 0, -1))):
        with Locations((5.275, -21.25)):
            Rectangle(SKETCH_82_W, SKETCH_82_H)
        with Locations((-5.275, -21.25)):
            Rectangle(SKETCH_82_W, SKETCH_82_H)
        with Locations((-1.525, -21.25)):
            Rectangle(SKETCH_82_W_2, SKETCH_82_H)
        with Locations((1.525, -21.25)):
            Rectangle(SKETCH_82_W_2, SKETCH_82_H)
    extrude(amount=-CUT_EXTRUDE_46_DEPTH, mode=Mode.SUBTRACT)


solid = part.part
